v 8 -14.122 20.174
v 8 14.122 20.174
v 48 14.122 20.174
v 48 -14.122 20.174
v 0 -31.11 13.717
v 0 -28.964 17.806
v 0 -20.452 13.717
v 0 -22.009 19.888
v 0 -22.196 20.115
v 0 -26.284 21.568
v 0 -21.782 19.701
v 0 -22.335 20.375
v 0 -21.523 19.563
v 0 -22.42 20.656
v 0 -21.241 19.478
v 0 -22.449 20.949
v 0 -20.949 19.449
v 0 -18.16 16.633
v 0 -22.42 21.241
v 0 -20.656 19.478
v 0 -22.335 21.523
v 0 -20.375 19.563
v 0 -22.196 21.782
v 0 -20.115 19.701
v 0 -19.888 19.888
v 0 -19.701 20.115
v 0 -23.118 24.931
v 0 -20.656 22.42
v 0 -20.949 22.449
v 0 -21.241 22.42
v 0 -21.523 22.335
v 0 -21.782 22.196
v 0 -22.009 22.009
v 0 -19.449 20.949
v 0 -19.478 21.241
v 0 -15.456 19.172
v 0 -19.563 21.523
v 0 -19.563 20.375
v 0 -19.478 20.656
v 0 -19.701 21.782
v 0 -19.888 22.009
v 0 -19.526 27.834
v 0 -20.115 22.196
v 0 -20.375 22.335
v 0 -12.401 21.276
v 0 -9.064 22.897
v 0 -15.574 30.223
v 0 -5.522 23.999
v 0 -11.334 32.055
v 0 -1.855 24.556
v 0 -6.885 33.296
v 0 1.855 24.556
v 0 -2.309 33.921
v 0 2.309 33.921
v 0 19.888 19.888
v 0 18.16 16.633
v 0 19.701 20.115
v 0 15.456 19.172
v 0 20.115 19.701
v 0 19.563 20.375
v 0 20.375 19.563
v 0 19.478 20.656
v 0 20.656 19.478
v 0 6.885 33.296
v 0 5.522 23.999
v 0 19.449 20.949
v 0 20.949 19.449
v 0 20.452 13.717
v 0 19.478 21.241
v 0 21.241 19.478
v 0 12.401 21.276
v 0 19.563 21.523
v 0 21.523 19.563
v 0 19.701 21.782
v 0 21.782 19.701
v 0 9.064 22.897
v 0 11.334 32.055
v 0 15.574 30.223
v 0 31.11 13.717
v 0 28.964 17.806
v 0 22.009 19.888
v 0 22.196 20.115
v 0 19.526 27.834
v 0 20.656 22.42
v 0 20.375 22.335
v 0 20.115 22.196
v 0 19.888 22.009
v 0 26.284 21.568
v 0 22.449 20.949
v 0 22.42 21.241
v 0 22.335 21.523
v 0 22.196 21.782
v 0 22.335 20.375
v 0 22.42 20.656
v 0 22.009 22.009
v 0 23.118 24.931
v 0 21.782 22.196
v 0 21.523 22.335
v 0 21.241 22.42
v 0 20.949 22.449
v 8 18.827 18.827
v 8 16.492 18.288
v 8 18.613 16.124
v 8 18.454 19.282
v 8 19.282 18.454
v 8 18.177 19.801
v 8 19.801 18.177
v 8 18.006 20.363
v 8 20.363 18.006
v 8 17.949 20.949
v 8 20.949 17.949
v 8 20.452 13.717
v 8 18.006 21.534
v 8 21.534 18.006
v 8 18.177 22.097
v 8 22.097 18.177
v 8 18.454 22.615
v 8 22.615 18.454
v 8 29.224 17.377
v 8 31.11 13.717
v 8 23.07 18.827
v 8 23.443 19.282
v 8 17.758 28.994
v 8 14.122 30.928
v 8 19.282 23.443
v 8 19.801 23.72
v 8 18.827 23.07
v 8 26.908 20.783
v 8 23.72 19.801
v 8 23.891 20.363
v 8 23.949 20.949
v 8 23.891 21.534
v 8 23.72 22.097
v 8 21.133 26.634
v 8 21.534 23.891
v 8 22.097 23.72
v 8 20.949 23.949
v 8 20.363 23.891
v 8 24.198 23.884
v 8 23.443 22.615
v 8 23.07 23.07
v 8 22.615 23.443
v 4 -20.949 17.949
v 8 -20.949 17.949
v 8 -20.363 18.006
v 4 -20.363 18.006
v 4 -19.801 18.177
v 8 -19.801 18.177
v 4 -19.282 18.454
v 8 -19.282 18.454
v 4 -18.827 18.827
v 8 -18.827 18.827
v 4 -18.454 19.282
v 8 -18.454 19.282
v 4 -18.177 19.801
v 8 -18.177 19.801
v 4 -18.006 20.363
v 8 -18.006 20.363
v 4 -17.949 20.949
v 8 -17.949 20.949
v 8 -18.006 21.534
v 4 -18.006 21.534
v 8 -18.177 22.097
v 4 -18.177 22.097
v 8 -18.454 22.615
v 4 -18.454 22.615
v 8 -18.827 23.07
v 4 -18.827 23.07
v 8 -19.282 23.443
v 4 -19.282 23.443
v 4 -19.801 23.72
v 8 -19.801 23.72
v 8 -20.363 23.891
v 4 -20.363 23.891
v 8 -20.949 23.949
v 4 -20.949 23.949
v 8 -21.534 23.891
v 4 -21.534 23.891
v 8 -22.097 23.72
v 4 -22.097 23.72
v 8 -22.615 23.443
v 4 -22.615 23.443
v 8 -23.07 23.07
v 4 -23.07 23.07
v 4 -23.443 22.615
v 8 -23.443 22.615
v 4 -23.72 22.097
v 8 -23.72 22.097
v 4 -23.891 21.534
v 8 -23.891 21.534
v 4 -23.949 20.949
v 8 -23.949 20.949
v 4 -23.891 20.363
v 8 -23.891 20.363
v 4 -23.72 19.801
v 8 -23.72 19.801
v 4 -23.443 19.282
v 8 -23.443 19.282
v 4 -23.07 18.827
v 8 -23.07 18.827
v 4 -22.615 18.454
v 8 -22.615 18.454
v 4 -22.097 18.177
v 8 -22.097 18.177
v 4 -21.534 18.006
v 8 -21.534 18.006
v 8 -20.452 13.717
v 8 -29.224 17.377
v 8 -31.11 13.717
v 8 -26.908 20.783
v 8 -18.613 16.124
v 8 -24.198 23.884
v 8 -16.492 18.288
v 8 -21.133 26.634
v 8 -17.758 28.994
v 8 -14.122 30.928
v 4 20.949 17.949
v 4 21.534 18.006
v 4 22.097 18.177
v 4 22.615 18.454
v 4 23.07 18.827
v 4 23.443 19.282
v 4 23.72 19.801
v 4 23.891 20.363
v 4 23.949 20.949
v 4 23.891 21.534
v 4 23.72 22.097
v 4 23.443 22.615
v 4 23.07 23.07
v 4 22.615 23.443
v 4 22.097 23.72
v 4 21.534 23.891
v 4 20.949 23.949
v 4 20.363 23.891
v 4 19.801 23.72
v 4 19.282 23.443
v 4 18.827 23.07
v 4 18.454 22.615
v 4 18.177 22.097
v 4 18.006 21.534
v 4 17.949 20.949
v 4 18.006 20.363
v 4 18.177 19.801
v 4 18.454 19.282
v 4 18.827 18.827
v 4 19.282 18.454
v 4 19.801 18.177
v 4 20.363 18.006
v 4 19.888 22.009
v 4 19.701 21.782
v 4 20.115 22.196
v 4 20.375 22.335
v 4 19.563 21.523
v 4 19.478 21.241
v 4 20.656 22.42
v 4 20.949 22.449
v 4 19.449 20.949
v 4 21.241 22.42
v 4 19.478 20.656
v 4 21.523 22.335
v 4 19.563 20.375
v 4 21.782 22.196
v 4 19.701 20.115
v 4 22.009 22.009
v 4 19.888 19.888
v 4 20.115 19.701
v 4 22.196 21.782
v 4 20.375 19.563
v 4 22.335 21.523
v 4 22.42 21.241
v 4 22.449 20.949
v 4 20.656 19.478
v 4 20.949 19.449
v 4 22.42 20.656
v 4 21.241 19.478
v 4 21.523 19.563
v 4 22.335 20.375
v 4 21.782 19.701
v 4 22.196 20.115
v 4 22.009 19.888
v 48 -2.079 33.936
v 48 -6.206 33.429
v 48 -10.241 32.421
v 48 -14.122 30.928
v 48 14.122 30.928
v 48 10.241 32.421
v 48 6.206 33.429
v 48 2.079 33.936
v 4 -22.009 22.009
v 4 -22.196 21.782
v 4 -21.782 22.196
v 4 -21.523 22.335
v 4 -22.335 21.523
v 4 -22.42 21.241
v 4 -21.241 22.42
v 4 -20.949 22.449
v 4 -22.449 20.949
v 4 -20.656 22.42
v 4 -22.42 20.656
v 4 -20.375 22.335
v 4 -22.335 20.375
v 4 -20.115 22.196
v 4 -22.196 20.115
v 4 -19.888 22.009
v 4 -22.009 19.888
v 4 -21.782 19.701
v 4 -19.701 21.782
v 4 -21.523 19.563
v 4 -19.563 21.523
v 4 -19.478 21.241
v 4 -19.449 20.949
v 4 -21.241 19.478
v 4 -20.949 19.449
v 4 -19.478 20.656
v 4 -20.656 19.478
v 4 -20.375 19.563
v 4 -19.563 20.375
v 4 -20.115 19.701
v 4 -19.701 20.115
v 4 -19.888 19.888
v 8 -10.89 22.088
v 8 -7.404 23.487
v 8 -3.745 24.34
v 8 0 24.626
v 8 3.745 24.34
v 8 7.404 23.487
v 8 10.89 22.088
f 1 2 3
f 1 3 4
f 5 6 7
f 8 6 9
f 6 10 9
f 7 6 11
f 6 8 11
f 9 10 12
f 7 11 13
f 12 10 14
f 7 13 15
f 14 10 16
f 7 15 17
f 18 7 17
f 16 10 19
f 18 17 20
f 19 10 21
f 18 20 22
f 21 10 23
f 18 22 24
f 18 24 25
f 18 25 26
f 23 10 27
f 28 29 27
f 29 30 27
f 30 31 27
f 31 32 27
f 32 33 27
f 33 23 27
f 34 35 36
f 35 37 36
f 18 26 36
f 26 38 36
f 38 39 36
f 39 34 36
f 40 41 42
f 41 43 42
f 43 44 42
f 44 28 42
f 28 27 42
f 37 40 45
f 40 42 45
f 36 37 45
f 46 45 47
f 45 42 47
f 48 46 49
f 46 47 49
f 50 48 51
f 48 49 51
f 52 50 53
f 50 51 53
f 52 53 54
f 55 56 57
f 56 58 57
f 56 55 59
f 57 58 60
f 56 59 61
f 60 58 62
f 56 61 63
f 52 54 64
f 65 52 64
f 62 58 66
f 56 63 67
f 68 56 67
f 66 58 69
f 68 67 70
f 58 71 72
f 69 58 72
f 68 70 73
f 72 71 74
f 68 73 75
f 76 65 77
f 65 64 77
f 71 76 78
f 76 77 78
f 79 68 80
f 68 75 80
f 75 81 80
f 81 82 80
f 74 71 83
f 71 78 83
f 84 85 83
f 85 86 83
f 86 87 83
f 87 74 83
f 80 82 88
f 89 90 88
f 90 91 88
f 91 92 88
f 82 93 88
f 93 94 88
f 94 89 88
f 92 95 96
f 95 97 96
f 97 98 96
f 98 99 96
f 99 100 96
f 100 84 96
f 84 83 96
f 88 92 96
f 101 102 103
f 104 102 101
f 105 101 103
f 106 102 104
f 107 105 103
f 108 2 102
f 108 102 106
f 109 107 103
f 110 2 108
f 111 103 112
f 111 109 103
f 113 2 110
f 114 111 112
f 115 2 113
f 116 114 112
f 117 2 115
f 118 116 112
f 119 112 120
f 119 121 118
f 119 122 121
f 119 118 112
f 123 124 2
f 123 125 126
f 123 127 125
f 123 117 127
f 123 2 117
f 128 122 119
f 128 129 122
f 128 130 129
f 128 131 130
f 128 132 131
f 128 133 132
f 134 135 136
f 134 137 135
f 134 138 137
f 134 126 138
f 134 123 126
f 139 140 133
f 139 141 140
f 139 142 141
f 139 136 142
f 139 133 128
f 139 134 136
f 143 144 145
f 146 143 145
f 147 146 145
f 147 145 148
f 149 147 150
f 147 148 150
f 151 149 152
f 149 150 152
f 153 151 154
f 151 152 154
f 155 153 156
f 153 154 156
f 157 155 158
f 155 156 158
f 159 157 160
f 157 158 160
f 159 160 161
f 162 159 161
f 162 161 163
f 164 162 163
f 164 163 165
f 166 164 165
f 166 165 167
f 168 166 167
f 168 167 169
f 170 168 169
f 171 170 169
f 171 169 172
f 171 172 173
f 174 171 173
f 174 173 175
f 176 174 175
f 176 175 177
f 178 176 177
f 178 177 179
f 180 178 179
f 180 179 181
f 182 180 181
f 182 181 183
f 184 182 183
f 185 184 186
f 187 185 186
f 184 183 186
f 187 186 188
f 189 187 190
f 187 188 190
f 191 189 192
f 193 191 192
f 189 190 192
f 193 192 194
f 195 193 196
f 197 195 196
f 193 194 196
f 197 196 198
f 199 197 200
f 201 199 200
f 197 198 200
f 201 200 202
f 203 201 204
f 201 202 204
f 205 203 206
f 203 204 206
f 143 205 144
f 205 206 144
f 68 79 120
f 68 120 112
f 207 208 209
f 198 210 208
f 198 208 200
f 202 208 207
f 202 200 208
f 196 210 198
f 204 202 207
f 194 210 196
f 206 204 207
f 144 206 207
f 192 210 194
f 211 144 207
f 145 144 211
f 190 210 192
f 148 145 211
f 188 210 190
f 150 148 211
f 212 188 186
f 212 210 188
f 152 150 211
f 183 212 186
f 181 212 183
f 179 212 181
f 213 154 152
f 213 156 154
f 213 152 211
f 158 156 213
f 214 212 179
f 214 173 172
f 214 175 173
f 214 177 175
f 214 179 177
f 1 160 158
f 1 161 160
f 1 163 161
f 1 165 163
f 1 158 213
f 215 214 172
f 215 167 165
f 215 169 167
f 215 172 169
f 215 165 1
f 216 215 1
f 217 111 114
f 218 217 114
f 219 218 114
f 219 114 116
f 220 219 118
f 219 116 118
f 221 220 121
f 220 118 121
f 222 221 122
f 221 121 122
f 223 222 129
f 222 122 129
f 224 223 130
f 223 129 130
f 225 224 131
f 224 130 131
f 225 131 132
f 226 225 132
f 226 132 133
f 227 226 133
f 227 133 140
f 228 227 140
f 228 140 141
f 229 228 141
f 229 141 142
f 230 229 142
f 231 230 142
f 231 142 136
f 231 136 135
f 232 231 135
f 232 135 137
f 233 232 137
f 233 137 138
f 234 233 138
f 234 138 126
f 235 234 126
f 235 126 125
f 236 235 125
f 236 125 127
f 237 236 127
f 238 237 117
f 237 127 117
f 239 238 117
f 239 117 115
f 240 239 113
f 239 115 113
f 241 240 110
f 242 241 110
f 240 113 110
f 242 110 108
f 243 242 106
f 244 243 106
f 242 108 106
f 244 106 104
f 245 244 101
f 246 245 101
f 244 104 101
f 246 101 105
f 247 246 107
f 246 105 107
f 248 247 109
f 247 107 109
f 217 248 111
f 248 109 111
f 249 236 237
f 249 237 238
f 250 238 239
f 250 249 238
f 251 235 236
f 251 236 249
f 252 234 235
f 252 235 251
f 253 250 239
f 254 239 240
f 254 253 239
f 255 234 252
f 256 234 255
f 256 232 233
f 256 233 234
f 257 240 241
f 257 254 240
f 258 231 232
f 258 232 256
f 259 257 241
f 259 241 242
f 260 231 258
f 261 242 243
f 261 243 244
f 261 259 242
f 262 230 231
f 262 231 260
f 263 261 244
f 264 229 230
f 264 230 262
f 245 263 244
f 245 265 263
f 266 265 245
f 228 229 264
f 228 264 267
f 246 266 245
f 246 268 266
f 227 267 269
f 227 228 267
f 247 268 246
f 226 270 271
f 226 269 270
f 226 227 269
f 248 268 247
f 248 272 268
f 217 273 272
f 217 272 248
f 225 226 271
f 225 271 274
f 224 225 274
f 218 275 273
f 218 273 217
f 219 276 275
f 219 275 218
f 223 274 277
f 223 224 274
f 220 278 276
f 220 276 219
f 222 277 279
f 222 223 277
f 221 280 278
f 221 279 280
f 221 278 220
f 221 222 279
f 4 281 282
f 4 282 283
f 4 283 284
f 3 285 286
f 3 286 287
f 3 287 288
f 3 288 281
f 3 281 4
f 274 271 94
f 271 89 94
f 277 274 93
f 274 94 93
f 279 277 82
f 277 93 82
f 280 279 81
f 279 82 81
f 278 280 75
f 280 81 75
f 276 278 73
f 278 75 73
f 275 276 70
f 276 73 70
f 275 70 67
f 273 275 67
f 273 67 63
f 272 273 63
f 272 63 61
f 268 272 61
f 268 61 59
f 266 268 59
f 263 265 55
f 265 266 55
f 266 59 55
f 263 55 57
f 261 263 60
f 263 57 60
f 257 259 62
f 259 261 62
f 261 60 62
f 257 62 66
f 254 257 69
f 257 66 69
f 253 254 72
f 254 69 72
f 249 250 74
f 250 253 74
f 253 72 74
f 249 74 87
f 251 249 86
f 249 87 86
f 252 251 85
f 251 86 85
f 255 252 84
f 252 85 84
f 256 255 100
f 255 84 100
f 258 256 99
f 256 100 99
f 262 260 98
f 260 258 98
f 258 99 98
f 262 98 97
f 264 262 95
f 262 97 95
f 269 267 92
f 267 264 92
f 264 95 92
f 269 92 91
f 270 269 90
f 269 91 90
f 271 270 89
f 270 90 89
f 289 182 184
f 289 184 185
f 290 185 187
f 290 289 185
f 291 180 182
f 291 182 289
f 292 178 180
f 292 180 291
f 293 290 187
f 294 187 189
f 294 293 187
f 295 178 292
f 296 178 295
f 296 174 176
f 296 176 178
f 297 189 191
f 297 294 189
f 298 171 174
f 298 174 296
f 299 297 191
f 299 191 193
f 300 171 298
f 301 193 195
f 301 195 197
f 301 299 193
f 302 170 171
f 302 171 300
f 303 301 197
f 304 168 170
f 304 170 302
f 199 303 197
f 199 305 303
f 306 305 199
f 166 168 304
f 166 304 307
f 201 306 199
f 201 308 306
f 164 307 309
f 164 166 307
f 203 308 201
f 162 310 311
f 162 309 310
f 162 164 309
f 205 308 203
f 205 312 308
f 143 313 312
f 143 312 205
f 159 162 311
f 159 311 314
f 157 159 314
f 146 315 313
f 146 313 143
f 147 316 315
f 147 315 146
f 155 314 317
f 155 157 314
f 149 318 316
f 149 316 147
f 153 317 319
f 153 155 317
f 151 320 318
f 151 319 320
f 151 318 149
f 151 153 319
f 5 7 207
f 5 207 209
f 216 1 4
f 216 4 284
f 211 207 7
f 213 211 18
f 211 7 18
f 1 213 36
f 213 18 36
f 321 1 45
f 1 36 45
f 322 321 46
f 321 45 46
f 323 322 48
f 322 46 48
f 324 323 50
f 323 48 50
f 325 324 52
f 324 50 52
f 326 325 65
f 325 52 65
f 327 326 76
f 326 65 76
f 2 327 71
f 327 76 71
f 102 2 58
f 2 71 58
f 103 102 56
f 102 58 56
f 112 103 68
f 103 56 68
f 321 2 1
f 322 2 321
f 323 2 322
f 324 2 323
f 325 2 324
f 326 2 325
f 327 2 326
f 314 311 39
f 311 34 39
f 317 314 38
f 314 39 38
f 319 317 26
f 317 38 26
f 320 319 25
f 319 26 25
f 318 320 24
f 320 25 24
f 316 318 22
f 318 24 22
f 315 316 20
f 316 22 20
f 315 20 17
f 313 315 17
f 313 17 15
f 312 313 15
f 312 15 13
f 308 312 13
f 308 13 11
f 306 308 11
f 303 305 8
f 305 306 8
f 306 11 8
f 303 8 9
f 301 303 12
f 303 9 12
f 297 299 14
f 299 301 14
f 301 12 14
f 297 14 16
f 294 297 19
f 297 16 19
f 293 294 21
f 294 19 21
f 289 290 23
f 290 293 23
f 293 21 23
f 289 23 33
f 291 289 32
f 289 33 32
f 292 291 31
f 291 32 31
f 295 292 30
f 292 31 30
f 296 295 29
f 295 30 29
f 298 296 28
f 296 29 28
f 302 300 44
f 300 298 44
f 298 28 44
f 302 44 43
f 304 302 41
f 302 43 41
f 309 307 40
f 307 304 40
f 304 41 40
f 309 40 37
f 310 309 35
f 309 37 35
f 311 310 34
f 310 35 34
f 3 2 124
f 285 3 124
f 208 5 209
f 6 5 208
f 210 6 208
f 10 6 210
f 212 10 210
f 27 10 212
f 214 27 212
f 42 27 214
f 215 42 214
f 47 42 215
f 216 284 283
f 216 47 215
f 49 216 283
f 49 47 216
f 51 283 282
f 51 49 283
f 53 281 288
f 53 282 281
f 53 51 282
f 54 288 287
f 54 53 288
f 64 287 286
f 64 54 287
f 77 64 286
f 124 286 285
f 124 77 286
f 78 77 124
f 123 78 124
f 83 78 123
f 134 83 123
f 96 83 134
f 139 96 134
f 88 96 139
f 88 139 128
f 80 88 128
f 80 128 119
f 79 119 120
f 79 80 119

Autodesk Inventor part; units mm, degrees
ref_plane "YZ Plane" through (0, 0, 0) normal (1, 0, 0) x (0, 1, 0)
ref_plane "XZ Plane" through (0, 0, 0) normal (0, 1, 0) x (-1, 0, 0)
ref_plane "XY Plane" through (0, 0, 0) normal (0, 0, 1) x (1, 0, 0)
sketch "Sketch1" plane through (0, 0, 0) normal (1, 0, 0) x (0, 1, 0)
  arc A0 (31.1103, 13.7167) -> (-31.1103, 13.7167) centre (0, 0) ccw
  arc A1 (20.4522, 13.7167) -> (-20.4522, 13.7167) centre (0, 0) ccw
  line L0 (0, 0) -> (34, 0) construction
  circle A2 centre (20.9487, 20.9487) radius 1.5
  line L1 (31.1103, 13.7167) -> (20.4522, 13.7167)
  line L2 (-20.4522, 13.7167) -> (-31.1103, 13.7167)
  line L3 (0, 0) -> (34, 0) construction
  circle A3 centre (-20.9487, 20.9487) radius 1.5
extrude "Extrusion1" add sketch "Sketch1" along normal blind 8
sketch "Sketch2" plane through (8, 0, 0) normal (1, 0, 0) x (0, 0, -1)
  circle A0 centre (-20.9487, 20.9487) radius 1.5 projected
  circle A1 centre (-20.9487, 20.9487) radius 3
  circle A2 centre (-20.9487, -20.9487) radius 1.5 projected
  circle A3 centre (-20.9487, -20.9487) radius 3
  point P0 (0, 0)
  dimension "d8" = 6
extrude "Extrusion2" cut sketch "Sketch2" against normal blind 4
sketch "Sketch3" plane through (8, 0, 0) normal (1, 0, 0) x (0, 0, -1)
  line L0 (-20.1744, 14.1221) -> (-30.9284, 14.1221)
  arc A0 (-13.7167, 31.1103) -> (-13.7167, -31.1103) centre (0, 0) ccw projected
  line L1 (-20.1744, -14.1221) -> (-30.9284, -14.1221)
  arc A1 (-30.9284, 14.1221) -> (-30.9284, -14.1221) centre (0, 0) ccw
  line L2 (-20.1744, 14.1221) -> (-20.1744, -14.1221)
extrude "Extrusion3" add sketch "Sketch3" along normal blind 40
properties part number "Lid_Tilt"
